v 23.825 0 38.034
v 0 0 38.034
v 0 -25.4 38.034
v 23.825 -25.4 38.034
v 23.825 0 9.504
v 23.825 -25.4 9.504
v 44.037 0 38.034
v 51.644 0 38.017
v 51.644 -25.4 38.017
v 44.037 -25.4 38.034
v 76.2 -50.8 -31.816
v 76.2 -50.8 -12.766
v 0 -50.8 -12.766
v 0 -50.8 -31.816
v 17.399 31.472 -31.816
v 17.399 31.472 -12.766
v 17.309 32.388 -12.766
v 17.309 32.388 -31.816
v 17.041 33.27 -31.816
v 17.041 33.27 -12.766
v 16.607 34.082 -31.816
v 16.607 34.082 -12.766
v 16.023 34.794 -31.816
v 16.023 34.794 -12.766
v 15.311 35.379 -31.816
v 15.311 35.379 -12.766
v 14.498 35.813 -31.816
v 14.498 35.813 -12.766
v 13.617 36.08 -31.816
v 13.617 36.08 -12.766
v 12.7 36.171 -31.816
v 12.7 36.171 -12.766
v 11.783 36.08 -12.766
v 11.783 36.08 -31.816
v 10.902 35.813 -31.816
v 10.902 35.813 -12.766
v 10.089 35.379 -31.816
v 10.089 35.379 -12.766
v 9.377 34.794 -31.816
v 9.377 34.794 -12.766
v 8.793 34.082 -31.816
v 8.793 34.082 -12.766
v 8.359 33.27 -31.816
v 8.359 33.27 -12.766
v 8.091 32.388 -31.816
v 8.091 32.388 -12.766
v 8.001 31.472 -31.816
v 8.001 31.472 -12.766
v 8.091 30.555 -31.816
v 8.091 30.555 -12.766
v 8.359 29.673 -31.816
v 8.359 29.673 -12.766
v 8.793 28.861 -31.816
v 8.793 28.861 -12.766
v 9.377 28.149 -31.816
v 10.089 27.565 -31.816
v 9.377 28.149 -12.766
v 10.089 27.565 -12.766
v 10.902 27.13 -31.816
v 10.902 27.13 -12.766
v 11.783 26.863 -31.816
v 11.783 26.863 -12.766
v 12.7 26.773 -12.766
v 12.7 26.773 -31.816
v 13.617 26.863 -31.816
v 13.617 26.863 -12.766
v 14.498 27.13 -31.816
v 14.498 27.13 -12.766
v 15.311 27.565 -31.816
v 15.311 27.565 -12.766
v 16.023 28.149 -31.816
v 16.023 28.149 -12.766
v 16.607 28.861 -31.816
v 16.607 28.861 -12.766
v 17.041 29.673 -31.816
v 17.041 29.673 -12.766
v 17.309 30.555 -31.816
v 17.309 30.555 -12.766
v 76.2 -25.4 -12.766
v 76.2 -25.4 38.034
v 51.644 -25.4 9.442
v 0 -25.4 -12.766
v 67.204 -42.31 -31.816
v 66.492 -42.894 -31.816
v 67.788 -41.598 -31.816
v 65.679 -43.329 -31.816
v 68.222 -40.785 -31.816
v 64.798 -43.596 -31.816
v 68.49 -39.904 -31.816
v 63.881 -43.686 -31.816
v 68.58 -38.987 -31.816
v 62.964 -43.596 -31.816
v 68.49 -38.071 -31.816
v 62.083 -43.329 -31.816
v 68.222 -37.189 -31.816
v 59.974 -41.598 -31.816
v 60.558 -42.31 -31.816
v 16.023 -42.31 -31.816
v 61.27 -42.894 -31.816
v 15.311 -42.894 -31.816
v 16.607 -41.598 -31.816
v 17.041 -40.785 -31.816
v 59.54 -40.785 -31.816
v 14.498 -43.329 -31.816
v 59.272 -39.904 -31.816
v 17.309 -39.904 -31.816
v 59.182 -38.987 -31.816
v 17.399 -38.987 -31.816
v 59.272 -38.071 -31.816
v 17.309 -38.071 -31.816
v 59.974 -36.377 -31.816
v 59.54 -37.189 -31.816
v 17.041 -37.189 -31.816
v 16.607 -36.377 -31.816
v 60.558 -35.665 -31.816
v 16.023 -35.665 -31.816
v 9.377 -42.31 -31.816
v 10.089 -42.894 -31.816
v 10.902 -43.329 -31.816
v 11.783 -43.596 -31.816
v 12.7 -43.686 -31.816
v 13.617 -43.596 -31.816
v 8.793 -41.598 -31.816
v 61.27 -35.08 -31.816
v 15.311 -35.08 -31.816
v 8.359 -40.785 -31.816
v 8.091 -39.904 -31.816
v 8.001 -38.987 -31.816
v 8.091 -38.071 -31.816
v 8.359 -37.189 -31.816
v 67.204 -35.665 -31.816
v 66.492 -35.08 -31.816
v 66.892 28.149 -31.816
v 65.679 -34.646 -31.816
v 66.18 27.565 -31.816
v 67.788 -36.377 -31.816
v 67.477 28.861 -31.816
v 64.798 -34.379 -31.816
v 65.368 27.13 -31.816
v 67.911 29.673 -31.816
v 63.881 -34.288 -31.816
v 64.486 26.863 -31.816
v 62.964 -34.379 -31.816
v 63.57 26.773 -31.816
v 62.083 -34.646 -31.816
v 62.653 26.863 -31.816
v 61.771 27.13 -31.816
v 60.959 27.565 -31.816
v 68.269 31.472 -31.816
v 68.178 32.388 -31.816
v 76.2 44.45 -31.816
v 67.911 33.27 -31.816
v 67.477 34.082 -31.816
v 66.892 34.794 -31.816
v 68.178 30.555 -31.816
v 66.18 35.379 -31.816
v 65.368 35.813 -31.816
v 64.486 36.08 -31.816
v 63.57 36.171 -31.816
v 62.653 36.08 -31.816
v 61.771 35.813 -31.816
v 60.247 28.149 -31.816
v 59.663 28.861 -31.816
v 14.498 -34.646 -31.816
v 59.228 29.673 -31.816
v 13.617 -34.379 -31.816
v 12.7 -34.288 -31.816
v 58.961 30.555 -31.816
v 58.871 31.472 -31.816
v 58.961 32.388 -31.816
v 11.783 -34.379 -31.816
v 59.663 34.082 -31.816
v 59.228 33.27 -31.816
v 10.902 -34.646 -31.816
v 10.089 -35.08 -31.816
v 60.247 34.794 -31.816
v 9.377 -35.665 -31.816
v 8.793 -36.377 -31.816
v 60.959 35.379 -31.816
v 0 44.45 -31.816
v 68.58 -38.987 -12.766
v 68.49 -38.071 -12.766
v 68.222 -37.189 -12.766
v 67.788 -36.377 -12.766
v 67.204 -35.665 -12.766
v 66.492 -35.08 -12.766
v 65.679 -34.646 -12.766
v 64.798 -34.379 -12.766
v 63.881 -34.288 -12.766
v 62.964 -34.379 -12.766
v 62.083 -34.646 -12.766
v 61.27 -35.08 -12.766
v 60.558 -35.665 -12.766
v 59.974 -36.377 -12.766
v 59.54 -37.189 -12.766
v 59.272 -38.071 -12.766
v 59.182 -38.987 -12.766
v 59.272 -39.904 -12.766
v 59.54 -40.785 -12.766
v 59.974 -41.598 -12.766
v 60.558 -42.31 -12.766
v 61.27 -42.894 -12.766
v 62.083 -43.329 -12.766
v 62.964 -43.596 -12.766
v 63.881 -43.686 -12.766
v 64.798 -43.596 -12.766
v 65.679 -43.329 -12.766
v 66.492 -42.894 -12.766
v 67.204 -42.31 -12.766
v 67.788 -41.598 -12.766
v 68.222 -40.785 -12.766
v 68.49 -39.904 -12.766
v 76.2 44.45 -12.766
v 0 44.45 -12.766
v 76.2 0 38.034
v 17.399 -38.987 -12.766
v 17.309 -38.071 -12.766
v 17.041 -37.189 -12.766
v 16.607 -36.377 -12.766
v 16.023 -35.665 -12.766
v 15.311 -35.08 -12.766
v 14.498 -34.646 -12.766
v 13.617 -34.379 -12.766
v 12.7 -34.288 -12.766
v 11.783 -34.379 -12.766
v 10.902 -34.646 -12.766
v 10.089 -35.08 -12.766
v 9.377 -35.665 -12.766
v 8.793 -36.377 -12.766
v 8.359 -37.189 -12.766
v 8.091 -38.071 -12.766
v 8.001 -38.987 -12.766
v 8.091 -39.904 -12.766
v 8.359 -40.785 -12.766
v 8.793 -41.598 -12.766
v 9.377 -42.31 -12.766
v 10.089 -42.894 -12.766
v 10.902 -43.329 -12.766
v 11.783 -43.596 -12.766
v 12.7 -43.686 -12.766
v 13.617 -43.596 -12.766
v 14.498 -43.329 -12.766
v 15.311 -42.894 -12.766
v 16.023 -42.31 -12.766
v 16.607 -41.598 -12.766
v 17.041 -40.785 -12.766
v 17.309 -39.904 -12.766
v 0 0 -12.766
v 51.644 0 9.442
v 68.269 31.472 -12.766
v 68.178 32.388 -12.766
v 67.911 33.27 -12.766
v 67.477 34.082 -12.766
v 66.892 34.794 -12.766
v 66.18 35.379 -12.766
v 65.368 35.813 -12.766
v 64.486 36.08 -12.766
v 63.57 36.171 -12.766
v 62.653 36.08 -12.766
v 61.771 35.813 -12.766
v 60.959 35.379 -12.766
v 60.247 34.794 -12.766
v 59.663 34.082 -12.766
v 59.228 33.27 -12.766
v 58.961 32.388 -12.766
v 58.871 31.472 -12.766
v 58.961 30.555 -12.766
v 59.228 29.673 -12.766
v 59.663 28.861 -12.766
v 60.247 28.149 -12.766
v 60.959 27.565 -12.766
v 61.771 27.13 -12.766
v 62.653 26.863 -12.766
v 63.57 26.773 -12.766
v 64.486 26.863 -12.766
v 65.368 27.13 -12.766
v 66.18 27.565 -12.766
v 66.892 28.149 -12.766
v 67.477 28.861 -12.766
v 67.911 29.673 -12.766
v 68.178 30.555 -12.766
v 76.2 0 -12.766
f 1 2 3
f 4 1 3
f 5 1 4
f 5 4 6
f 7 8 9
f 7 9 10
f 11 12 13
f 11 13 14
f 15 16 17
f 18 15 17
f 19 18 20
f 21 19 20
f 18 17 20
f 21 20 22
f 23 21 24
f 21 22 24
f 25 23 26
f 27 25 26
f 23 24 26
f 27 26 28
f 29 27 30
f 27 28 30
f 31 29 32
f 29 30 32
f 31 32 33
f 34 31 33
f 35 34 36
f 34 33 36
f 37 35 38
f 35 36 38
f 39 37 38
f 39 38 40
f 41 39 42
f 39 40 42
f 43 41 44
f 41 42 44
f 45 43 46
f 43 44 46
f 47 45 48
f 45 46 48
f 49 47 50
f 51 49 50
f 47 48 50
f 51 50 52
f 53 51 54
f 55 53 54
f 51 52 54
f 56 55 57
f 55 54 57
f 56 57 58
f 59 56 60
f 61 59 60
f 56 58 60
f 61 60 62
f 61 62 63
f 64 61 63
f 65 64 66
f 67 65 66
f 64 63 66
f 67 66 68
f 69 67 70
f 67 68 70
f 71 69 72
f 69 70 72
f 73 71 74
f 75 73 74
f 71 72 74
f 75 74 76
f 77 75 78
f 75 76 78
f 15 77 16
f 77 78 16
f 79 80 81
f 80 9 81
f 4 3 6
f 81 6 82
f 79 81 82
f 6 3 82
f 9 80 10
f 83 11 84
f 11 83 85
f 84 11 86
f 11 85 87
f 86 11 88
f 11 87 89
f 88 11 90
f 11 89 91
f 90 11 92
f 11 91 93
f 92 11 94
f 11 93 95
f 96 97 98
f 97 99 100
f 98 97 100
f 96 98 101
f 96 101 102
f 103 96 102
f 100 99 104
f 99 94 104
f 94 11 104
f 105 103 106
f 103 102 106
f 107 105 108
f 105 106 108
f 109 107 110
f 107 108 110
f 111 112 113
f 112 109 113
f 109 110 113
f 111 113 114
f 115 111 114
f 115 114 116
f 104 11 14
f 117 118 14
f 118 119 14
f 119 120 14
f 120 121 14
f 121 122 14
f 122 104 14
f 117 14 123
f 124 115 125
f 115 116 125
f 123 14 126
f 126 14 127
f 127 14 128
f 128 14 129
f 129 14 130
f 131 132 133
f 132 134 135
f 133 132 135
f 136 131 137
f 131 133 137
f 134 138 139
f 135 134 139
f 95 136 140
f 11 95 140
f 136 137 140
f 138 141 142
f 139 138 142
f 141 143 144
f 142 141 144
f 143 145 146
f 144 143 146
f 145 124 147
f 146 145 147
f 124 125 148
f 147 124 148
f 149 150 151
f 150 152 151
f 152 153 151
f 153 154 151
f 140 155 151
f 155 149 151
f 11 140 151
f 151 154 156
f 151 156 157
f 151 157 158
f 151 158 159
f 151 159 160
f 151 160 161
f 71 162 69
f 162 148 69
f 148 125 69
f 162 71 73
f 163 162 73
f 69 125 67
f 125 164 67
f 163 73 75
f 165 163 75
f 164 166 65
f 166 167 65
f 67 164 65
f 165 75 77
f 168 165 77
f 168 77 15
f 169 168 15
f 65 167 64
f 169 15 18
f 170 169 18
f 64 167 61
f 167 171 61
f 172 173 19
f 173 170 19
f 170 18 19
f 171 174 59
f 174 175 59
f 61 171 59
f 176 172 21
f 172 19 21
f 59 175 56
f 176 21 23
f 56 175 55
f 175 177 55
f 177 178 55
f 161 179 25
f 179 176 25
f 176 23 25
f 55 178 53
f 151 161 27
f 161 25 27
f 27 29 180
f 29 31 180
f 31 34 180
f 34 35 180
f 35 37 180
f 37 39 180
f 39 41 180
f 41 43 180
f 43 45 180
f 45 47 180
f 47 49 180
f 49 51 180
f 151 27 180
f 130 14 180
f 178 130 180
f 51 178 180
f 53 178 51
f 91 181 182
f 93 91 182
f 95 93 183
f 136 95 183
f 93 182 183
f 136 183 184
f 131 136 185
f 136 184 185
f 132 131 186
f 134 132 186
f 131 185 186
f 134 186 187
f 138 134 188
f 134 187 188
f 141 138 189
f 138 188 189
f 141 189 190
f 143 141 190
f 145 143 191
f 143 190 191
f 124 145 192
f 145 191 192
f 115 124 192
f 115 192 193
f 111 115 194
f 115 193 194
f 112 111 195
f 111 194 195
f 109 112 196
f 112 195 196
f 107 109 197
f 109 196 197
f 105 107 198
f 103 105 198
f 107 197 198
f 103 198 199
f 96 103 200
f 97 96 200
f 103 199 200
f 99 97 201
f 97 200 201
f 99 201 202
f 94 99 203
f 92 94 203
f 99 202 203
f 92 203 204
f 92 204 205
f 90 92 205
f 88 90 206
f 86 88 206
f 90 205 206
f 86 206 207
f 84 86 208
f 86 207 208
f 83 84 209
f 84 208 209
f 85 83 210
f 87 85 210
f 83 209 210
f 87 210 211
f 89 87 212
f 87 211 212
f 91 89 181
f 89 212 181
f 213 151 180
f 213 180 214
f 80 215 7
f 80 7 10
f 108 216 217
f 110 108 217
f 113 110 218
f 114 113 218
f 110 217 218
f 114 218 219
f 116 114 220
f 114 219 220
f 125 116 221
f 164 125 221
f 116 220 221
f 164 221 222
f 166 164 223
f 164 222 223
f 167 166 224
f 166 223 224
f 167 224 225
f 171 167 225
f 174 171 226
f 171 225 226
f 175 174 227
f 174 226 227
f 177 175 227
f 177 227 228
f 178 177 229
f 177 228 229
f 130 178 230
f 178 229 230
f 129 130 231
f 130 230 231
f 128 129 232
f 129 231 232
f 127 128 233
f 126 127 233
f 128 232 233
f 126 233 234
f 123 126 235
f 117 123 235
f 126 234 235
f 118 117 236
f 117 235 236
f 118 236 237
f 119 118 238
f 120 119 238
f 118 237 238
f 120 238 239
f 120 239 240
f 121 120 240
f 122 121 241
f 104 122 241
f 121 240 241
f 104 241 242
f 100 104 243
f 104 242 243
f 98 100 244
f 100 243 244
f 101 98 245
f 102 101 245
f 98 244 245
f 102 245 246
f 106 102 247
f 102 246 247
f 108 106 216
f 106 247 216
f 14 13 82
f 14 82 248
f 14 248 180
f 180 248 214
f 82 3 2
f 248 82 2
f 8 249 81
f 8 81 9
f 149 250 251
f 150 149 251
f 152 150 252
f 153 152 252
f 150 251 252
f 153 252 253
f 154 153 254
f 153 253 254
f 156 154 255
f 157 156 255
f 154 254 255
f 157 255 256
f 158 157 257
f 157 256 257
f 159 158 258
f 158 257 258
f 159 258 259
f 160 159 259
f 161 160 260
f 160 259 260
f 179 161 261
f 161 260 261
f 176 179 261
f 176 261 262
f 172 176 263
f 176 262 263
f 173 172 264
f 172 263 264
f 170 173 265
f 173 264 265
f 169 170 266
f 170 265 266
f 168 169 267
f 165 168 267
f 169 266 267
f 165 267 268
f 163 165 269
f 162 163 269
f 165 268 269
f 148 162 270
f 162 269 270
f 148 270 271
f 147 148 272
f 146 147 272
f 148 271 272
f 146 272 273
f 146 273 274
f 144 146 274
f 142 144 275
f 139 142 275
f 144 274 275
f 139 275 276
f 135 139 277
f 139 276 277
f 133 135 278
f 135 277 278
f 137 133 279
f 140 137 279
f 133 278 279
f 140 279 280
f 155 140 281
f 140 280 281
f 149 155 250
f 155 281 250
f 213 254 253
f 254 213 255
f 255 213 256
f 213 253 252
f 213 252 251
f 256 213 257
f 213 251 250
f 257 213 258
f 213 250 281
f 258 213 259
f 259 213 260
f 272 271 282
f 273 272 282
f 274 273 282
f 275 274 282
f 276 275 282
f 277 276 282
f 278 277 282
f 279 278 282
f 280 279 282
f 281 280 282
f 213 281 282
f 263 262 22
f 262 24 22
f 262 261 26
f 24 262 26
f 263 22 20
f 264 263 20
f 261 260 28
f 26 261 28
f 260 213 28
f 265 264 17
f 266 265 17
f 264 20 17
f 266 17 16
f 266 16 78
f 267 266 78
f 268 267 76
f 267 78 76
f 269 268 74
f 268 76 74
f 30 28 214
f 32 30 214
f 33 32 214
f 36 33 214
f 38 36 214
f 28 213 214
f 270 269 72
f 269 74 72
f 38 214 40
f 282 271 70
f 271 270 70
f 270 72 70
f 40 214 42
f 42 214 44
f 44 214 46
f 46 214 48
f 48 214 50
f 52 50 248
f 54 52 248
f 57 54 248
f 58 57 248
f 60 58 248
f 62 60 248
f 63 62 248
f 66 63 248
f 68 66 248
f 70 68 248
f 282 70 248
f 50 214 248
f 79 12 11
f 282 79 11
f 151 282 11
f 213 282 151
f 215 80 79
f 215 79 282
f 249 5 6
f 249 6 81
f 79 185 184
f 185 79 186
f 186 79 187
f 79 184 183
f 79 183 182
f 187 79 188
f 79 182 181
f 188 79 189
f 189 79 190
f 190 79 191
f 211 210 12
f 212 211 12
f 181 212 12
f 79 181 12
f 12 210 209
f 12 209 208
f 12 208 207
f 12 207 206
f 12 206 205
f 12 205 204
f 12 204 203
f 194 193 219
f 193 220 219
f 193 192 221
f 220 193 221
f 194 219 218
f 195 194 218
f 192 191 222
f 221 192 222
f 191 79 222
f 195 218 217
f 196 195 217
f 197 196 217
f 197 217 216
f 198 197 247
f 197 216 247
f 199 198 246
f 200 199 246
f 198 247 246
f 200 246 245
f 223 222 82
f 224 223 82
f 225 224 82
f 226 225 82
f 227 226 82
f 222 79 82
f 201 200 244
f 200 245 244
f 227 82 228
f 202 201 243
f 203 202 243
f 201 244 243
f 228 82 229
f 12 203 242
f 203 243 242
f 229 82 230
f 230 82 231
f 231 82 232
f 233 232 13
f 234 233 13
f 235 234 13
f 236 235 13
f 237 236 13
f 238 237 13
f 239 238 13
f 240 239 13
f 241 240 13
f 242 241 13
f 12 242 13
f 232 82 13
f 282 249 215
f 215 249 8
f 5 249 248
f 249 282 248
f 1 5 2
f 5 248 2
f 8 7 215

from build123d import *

# Parameters (mm, degrees)
F1_DEPTH = 76.2
F3_R     = 4.699
F4_DEPTH = 19.05
F5_DEPTH = 26.162


with BuildPart() as f1:
    # F0 (on Right) → F1 (new body)
    with BuildSketch(Plane.YZ):
        Polygon((-50.8, -31.816228), (44.45, -31.816228), (44.45, -12.766228), (0, -12.766228), (0, 38.033772), (-25.4, 38.033772), (-25.4, -12.766228), (-50.8, -12.766228), align=None)
    extrude(amount=F1_DEPTH)

    # F3 (on face) → F4 (cut)
    with BuildSketch(Plane.XY.offset(-12.766228)):
        with Locations((63.56959, 31.471644)):
            Circle(F3_R)
        with Locations((12.7, 31.471644)):
            Circle(F3_R)
        with Locations((12.7, -38.98726)):
            Circle(F3_R)
        with Locations((63.881002, -38.98726)):
            Circle(F3_R)
    extrude(amount=-F4_DEPTH, mode=Mode.SUBTRACT)

    # F2 (on Front) → F5 (cut)
    with BuildSketch(Plane.XZ):
        Polygon((51.643919, 9.441765), (51.643919, 38.016765), (23.8252, 38.07896), (23.8252, 9.50396), align=None)
    extrude(amount=F5_DEPTH, mode=Mode.SUBTRACT)


solid = f1.part
